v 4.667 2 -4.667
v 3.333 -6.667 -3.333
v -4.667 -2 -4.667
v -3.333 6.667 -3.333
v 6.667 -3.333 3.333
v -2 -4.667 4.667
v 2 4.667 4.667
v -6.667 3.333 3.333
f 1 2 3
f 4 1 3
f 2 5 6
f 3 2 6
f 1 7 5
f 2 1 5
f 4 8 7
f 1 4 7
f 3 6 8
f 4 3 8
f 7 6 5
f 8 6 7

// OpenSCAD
a=cubemesh3();
b=glue(a);
c=smoothMesh(b);

polyhedronMesh(c);
 

function glue(points,faces)=
faces==undef?glue(points[0],points[1]):
    let( usedpoints=([for(i=faces,j=i)points[j]]),

upoints=truepoints(unique(points)),
nfaces= [for(i=faces)[for(j=i)
    search([points[j]],upoints,1)[0]]])
[upoints,nfaces];

function truepoints(p)=[for(i=p)if(i!=undef)i];

function  uniquejoin(m,n) =  
    concat(m,[   for (i = n)    if (search([i],m,1)==[[]]) i  ]);

//function  unique(m) = [   for (i = [0: len(m) - 1])    if (search([m[i]],m,1)==[i]) m[i] ];

function  unique(m,first,last) = last==undef?unique(m,0,len(m)-1) :
last-first>1? let(mid=(first+last)/2)
uniquejoin(  unique(m,first,floor(mid)),         unique(m,ceil(mid),last) )
 :m[first]==undef? [m[last]]: m[last]==undef?[m[first]] :concat([m[first]],[if( m[last]!=m[first])m[last]] ) ;





function cubemesh3() =  [[[-10, -10, -10], [10, -10, -10], [10, 10, -10], [-10, 10, -10], [10, -10, 10], [-10, -10, 10], [10, 10, 10], [-10, 10, 10]], [[0, 1, 2], [0, 2, 3], [5, 4, 1], [5, 1, 0], [4, 6, 2], [4, 2, 1], [6, 7, 3], [6, 3, 2], [7, 5, 0], [7, 0, 3],[4,5,6],[6,5,7]]];
 
 module polyhedronMesh(mesh){polyhedron(mesh[0],mesh[1]);}

function smoothMesh(points, faces,  c = 1,neighbours) =
is_undef(faces )?smoothMesh(points[0],points[1],  c,neighbours):
is_undef(neighbours)?let(neighbours=pointneighbours (points,faces)) smoothMesh(points ,faces,  c,neighbours):
  echo("smoothMesh",points,faces,neighbours)

    let ( t = relaxmesh(points, faces, neighbours, c))
    t;


function relaxmesh(points, faces, neighbours, c = 1) = c >0 ?
 let(fmp=   facemidpoints(points ,faces))  
echo(fmp) 
 relaxmesh(
pointneighbourscenterpoint(
 fmp,neighbours,points)
, faces, neighbours, c - 1):
 [points, faces];

function pointneighbours (points,faces)= [
    for (i = [0: len(points) - 1])
        [for (j = [0: len(faces) - 1])
    if (faces[j][0] == i || faces[j][1] == i || faces[j][2] == i || faces[j][3] == i) j]
        ];
        
function pointneighbourscenterpoint(midpoints,neighbours,points)=
[for (i = [0: len(points) - 1]) len(neighbours[i]) > 1 ?
avrgp([for (j = [0: len(neighbours[i]) - 1]) midpoints[neighbours[i][j] ] ]):points[i]];
    
function facemidpoints (points,faces)= echo("\nfacemidpoints",points,"\n",faces)
let(p=points)
[for (f=faces)  (p[f[0]]+p[f[1]]+p[f[2]])/3];
    



function avrgp(l) =len(l) > 1 ? [for(l)1]* l / (len(l)) : l;

 
     
 module polyhedronMesh(mesh){polyhedron(mesh[0],mesh[1]);}
